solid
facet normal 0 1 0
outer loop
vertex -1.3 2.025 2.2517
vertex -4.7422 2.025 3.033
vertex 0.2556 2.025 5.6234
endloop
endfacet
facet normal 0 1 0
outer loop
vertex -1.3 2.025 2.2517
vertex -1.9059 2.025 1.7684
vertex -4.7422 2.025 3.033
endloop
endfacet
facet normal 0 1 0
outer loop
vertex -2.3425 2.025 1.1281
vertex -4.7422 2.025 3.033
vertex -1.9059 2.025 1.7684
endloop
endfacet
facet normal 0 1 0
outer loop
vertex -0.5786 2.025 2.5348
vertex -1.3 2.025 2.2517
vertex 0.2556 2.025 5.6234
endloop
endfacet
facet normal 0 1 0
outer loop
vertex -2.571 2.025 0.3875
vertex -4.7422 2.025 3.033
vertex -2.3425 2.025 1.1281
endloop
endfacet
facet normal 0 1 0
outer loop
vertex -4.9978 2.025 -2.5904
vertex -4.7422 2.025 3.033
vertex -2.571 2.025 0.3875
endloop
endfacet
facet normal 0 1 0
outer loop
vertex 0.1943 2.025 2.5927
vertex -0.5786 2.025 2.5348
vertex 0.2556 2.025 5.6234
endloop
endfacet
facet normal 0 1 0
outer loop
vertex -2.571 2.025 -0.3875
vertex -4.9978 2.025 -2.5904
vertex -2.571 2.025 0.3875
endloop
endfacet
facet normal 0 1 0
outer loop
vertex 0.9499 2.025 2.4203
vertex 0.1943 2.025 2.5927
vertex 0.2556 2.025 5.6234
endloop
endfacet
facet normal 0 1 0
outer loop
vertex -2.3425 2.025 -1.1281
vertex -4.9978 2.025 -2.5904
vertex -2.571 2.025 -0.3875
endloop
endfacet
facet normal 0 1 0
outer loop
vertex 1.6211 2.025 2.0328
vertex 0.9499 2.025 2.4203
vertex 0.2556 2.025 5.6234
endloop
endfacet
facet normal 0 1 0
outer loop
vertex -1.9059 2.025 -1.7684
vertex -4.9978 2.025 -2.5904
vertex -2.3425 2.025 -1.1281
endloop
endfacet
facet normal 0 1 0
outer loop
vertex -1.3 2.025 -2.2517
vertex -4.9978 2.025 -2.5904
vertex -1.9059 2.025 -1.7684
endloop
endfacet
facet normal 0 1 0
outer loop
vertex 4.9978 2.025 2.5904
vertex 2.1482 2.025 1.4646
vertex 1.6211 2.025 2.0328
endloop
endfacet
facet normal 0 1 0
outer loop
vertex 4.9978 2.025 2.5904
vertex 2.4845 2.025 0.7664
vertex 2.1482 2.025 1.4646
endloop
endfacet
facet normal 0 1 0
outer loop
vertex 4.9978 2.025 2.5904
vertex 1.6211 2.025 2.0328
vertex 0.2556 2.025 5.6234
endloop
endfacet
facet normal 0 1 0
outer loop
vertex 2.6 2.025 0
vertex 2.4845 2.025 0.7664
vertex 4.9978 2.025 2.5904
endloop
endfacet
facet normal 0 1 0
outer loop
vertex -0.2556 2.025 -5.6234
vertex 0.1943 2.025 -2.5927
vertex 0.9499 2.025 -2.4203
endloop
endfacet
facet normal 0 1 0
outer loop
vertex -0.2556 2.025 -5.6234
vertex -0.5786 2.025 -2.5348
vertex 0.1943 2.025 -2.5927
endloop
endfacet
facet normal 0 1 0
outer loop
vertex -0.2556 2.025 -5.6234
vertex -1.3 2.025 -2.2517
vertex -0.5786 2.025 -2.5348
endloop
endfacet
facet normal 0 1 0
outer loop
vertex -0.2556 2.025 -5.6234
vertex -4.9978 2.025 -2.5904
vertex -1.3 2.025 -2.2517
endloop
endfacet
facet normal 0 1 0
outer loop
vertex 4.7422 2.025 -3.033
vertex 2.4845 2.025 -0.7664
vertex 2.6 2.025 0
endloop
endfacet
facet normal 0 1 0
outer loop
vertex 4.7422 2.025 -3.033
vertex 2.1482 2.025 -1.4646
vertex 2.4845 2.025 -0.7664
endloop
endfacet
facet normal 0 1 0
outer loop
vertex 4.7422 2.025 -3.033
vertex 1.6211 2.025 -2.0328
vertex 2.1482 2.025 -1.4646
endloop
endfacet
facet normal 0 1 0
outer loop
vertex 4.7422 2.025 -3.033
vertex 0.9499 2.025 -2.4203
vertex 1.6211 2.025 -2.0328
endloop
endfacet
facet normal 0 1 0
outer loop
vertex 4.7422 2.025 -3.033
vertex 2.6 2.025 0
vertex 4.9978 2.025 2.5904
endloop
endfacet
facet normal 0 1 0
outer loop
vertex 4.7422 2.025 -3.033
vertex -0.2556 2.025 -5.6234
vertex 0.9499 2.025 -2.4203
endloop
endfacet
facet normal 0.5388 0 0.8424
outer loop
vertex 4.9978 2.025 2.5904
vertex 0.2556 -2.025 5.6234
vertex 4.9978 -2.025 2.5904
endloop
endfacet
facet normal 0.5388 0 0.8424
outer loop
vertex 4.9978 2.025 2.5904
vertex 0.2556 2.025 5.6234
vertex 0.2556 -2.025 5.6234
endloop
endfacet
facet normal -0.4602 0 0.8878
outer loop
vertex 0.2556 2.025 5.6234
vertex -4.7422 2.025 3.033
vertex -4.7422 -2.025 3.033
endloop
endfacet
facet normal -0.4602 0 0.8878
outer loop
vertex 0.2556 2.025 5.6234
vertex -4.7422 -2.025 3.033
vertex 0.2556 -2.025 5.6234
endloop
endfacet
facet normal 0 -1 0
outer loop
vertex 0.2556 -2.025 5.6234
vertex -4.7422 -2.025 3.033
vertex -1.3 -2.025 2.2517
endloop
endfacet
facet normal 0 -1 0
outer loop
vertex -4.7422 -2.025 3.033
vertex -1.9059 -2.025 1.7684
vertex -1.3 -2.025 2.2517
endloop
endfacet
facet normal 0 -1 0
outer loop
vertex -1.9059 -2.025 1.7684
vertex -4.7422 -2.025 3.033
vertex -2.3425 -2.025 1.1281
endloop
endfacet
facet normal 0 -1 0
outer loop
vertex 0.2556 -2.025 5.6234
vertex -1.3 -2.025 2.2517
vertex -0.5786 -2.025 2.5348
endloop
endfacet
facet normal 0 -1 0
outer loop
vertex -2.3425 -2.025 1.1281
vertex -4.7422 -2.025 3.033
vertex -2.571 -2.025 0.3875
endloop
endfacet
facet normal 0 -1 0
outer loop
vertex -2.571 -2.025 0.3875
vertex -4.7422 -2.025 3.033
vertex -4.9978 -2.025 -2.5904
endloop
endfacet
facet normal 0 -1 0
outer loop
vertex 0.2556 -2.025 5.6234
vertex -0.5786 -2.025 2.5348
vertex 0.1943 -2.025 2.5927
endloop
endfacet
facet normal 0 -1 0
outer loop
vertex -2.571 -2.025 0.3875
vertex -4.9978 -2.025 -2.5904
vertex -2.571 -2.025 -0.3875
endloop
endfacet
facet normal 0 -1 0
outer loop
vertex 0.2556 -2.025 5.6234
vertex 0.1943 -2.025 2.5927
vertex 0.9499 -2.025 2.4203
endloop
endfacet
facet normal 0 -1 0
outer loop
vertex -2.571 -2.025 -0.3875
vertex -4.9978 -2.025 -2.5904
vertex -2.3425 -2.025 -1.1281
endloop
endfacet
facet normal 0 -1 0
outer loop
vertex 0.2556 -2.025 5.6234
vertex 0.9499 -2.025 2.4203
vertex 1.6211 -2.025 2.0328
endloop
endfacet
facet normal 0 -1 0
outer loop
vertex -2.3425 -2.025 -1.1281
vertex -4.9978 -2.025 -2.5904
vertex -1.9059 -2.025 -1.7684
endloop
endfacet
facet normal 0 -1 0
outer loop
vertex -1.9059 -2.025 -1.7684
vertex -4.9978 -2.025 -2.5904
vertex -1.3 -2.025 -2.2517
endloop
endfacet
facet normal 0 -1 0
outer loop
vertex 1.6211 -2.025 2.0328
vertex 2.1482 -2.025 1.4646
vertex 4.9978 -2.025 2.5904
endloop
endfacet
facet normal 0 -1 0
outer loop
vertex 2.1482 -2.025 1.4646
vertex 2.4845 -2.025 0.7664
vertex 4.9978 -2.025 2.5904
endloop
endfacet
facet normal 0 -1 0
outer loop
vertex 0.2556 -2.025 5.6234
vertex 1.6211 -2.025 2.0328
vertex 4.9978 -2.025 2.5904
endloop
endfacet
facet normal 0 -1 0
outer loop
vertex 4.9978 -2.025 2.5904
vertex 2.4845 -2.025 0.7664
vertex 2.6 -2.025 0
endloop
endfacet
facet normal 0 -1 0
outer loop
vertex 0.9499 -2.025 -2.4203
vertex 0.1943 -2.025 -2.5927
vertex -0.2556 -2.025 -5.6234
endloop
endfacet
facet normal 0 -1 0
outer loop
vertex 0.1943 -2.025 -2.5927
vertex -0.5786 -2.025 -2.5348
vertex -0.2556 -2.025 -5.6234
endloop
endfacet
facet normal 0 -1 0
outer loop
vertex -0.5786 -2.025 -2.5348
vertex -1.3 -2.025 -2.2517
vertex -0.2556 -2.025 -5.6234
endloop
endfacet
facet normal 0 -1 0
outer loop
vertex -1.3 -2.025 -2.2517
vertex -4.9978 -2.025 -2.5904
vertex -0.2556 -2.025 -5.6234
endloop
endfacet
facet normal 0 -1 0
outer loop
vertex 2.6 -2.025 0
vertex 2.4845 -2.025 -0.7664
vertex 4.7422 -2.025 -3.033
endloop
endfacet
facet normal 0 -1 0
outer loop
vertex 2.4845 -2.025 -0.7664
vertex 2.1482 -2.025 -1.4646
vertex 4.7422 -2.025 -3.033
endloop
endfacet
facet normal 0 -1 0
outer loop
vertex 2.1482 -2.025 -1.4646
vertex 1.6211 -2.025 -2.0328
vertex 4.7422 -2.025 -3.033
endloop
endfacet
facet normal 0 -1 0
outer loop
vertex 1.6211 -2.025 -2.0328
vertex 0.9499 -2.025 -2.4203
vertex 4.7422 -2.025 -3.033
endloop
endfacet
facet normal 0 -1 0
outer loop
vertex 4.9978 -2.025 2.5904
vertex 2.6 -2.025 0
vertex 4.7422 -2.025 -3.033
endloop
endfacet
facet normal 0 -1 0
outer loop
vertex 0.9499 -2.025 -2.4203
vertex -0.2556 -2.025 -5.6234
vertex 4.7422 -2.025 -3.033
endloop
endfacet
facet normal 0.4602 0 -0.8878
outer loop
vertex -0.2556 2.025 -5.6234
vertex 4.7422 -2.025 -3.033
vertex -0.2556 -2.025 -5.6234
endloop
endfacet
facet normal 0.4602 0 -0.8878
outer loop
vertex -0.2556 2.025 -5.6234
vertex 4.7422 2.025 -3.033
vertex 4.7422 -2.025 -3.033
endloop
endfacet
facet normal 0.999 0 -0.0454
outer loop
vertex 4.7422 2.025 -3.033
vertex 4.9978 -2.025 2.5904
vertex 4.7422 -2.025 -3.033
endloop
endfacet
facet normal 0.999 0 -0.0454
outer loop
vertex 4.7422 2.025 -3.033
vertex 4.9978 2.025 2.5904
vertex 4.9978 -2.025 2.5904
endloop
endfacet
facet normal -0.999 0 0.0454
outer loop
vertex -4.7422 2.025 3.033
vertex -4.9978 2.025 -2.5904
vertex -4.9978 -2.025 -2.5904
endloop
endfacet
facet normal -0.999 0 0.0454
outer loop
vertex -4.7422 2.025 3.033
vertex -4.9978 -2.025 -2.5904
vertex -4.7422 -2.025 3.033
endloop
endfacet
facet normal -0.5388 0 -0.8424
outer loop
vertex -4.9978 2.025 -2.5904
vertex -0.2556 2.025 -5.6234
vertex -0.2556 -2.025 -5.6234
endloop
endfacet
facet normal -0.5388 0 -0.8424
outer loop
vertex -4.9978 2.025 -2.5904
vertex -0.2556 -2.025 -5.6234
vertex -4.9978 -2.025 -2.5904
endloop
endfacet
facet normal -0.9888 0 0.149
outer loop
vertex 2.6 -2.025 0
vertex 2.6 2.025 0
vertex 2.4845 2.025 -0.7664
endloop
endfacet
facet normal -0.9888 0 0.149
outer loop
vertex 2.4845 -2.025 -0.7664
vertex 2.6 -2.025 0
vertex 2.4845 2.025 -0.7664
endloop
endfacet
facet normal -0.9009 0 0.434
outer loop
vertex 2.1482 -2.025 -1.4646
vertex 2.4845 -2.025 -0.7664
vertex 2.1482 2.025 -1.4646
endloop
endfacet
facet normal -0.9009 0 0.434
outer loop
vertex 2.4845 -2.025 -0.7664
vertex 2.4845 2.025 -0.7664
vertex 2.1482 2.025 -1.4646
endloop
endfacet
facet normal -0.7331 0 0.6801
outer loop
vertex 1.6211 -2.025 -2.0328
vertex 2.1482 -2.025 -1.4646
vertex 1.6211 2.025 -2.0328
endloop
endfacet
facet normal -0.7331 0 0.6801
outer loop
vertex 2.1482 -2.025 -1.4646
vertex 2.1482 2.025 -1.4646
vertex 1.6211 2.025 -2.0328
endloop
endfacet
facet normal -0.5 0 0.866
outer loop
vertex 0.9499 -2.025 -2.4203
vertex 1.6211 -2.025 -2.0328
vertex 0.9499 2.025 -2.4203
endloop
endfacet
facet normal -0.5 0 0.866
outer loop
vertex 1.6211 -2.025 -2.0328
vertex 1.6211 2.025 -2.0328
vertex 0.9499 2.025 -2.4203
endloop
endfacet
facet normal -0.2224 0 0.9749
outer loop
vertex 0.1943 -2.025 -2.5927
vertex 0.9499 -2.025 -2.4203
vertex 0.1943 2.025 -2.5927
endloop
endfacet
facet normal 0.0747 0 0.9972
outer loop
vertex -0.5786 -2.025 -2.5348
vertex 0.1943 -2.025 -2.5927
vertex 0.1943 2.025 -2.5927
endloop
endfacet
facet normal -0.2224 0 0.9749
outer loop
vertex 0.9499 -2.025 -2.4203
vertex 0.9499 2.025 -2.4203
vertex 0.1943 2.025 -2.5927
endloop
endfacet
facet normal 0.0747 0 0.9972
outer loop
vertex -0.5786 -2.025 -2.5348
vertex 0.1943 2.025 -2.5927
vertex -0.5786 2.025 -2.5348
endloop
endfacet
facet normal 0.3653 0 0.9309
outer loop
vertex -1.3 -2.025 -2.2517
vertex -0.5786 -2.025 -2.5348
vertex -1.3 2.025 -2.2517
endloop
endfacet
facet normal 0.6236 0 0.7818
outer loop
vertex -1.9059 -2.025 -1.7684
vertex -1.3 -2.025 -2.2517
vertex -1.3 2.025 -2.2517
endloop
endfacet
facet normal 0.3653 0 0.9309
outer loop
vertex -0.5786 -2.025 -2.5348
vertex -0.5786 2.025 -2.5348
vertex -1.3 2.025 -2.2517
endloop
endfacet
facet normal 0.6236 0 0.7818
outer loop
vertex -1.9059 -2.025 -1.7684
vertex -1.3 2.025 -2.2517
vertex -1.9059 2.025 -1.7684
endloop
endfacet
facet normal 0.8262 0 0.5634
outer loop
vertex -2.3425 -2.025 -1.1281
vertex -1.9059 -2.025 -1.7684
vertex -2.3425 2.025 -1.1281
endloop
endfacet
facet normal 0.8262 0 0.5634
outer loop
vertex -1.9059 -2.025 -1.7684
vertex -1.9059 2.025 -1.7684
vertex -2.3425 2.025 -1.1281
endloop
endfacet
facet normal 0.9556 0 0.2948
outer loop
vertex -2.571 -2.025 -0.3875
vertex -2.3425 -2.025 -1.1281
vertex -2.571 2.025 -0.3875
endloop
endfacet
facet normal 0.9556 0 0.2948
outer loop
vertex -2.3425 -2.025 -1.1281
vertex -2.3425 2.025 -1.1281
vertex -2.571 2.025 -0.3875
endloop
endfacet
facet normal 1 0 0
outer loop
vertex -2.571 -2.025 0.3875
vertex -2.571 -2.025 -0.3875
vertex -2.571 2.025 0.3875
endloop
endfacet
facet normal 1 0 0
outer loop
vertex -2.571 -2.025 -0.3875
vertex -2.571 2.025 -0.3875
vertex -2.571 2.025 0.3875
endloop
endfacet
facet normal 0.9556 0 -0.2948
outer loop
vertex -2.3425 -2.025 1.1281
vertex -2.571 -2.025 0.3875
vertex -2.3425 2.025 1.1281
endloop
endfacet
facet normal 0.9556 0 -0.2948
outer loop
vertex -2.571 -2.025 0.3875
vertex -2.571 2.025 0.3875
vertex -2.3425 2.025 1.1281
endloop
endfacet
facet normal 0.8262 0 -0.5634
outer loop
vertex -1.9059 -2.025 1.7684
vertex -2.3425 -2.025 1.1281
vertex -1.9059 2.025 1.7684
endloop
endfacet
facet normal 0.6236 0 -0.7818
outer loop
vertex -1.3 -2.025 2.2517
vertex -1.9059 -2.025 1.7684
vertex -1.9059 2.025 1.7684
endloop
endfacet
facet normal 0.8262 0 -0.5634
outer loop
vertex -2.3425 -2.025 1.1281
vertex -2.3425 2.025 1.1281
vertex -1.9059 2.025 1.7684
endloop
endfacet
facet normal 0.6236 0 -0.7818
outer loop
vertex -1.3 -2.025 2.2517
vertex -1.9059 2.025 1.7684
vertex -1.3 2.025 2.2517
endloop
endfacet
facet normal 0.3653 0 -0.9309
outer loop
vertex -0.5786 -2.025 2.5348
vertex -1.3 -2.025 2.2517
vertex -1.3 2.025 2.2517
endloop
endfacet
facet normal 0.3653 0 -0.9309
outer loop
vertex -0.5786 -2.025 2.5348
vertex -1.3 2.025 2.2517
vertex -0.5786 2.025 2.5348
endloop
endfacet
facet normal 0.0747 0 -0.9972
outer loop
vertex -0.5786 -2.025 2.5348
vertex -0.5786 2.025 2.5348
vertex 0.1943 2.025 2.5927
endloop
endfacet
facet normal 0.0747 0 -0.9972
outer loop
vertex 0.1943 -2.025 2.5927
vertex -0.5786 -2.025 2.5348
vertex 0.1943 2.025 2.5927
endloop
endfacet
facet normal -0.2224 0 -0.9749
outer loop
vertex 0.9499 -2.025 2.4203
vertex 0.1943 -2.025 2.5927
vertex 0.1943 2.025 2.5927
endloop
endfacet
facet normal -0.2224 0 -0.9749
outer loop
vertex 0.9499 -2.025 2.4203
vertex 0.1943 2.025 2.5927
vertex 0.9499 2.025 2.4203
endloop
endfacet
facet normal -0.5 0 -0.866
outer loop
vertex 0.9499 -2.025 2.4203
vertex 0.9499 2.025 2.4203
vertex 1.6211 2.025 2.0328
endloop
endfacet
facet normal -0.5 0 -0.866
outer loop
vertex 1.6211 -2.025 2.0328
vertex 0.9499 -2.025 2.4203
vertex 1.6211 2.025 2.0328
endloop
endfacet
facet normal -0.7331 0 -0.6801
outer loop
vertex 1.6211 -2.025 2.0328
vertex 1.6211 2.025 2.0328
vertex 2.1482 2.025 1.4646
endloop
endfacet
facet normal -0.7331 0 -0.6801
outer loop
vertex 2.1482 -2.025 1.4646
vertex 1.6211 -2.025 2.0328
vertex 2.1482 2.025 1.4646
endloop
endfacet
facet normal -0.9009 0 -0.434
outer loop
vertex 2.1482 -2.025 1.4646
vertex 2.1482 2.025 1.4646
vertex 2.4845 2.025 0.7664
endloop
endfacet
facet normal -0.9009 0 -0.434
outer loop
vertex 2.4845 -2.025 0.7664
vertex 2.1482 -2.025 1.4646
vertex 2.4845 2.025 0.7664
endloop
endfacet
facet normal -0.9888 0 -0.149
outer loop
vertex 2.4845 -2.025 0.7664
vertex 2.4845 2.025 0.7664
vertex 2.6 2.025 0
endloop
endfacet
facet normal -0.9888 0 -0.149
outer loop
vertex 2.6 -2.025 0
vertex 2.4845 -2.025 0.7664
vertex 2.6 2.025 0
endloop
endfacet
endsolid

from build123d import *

# Parameters (mm, degrees)
BOSS_EXTRUDE1_DEPTH = 2.025
CUT_EXTRUDE1_REACH  = 6.05
SKETCH2_R           = 2.6


with BuildPart() as part:
    # Sketch1 → Boss-Extrude1 (new body, symmetric)
    with BuildSketch(Plane(origin=(0, 0, 0), x_dir=(1, 0, 0), z_dir=(0, 1, 0))):
        Polygon((4.742197554, 3.032995609), (-0.25555247, 5.623361356), (-4.997750023, 2.590365747), (-4.742197554, -3.032995609), (0.25555247, -5.623361356), (4.997750023, -2.590365747), align=None)
    extrude(amount=BOSS_EXTRUDE1_DEPTH, both=True)

    # Sketch2 → Cut-Extrude1 (cut, up to next)
    with BuildSketch(Plane(origin=(0, 2.025, 0), x_dir=(1, 0, 0), z_dir=(0, 1, 0)), mode=Mode.PRIVATE) as cut_extrude1_sk1:
        Circle(SKETCH2_R)
    cut_extrude1_tool1 = extrude(cut_extrude1_sk1.sketch, amount=-CUT_EXTRUDE1_REACH, mode=Mode.PRIVATE) & part.part
    add(cut_extrude1_tool1.solids().sort_by_distance((0, 2.025, 0))[0], mode=Mode.SUBTRACT)


solid = part.part
